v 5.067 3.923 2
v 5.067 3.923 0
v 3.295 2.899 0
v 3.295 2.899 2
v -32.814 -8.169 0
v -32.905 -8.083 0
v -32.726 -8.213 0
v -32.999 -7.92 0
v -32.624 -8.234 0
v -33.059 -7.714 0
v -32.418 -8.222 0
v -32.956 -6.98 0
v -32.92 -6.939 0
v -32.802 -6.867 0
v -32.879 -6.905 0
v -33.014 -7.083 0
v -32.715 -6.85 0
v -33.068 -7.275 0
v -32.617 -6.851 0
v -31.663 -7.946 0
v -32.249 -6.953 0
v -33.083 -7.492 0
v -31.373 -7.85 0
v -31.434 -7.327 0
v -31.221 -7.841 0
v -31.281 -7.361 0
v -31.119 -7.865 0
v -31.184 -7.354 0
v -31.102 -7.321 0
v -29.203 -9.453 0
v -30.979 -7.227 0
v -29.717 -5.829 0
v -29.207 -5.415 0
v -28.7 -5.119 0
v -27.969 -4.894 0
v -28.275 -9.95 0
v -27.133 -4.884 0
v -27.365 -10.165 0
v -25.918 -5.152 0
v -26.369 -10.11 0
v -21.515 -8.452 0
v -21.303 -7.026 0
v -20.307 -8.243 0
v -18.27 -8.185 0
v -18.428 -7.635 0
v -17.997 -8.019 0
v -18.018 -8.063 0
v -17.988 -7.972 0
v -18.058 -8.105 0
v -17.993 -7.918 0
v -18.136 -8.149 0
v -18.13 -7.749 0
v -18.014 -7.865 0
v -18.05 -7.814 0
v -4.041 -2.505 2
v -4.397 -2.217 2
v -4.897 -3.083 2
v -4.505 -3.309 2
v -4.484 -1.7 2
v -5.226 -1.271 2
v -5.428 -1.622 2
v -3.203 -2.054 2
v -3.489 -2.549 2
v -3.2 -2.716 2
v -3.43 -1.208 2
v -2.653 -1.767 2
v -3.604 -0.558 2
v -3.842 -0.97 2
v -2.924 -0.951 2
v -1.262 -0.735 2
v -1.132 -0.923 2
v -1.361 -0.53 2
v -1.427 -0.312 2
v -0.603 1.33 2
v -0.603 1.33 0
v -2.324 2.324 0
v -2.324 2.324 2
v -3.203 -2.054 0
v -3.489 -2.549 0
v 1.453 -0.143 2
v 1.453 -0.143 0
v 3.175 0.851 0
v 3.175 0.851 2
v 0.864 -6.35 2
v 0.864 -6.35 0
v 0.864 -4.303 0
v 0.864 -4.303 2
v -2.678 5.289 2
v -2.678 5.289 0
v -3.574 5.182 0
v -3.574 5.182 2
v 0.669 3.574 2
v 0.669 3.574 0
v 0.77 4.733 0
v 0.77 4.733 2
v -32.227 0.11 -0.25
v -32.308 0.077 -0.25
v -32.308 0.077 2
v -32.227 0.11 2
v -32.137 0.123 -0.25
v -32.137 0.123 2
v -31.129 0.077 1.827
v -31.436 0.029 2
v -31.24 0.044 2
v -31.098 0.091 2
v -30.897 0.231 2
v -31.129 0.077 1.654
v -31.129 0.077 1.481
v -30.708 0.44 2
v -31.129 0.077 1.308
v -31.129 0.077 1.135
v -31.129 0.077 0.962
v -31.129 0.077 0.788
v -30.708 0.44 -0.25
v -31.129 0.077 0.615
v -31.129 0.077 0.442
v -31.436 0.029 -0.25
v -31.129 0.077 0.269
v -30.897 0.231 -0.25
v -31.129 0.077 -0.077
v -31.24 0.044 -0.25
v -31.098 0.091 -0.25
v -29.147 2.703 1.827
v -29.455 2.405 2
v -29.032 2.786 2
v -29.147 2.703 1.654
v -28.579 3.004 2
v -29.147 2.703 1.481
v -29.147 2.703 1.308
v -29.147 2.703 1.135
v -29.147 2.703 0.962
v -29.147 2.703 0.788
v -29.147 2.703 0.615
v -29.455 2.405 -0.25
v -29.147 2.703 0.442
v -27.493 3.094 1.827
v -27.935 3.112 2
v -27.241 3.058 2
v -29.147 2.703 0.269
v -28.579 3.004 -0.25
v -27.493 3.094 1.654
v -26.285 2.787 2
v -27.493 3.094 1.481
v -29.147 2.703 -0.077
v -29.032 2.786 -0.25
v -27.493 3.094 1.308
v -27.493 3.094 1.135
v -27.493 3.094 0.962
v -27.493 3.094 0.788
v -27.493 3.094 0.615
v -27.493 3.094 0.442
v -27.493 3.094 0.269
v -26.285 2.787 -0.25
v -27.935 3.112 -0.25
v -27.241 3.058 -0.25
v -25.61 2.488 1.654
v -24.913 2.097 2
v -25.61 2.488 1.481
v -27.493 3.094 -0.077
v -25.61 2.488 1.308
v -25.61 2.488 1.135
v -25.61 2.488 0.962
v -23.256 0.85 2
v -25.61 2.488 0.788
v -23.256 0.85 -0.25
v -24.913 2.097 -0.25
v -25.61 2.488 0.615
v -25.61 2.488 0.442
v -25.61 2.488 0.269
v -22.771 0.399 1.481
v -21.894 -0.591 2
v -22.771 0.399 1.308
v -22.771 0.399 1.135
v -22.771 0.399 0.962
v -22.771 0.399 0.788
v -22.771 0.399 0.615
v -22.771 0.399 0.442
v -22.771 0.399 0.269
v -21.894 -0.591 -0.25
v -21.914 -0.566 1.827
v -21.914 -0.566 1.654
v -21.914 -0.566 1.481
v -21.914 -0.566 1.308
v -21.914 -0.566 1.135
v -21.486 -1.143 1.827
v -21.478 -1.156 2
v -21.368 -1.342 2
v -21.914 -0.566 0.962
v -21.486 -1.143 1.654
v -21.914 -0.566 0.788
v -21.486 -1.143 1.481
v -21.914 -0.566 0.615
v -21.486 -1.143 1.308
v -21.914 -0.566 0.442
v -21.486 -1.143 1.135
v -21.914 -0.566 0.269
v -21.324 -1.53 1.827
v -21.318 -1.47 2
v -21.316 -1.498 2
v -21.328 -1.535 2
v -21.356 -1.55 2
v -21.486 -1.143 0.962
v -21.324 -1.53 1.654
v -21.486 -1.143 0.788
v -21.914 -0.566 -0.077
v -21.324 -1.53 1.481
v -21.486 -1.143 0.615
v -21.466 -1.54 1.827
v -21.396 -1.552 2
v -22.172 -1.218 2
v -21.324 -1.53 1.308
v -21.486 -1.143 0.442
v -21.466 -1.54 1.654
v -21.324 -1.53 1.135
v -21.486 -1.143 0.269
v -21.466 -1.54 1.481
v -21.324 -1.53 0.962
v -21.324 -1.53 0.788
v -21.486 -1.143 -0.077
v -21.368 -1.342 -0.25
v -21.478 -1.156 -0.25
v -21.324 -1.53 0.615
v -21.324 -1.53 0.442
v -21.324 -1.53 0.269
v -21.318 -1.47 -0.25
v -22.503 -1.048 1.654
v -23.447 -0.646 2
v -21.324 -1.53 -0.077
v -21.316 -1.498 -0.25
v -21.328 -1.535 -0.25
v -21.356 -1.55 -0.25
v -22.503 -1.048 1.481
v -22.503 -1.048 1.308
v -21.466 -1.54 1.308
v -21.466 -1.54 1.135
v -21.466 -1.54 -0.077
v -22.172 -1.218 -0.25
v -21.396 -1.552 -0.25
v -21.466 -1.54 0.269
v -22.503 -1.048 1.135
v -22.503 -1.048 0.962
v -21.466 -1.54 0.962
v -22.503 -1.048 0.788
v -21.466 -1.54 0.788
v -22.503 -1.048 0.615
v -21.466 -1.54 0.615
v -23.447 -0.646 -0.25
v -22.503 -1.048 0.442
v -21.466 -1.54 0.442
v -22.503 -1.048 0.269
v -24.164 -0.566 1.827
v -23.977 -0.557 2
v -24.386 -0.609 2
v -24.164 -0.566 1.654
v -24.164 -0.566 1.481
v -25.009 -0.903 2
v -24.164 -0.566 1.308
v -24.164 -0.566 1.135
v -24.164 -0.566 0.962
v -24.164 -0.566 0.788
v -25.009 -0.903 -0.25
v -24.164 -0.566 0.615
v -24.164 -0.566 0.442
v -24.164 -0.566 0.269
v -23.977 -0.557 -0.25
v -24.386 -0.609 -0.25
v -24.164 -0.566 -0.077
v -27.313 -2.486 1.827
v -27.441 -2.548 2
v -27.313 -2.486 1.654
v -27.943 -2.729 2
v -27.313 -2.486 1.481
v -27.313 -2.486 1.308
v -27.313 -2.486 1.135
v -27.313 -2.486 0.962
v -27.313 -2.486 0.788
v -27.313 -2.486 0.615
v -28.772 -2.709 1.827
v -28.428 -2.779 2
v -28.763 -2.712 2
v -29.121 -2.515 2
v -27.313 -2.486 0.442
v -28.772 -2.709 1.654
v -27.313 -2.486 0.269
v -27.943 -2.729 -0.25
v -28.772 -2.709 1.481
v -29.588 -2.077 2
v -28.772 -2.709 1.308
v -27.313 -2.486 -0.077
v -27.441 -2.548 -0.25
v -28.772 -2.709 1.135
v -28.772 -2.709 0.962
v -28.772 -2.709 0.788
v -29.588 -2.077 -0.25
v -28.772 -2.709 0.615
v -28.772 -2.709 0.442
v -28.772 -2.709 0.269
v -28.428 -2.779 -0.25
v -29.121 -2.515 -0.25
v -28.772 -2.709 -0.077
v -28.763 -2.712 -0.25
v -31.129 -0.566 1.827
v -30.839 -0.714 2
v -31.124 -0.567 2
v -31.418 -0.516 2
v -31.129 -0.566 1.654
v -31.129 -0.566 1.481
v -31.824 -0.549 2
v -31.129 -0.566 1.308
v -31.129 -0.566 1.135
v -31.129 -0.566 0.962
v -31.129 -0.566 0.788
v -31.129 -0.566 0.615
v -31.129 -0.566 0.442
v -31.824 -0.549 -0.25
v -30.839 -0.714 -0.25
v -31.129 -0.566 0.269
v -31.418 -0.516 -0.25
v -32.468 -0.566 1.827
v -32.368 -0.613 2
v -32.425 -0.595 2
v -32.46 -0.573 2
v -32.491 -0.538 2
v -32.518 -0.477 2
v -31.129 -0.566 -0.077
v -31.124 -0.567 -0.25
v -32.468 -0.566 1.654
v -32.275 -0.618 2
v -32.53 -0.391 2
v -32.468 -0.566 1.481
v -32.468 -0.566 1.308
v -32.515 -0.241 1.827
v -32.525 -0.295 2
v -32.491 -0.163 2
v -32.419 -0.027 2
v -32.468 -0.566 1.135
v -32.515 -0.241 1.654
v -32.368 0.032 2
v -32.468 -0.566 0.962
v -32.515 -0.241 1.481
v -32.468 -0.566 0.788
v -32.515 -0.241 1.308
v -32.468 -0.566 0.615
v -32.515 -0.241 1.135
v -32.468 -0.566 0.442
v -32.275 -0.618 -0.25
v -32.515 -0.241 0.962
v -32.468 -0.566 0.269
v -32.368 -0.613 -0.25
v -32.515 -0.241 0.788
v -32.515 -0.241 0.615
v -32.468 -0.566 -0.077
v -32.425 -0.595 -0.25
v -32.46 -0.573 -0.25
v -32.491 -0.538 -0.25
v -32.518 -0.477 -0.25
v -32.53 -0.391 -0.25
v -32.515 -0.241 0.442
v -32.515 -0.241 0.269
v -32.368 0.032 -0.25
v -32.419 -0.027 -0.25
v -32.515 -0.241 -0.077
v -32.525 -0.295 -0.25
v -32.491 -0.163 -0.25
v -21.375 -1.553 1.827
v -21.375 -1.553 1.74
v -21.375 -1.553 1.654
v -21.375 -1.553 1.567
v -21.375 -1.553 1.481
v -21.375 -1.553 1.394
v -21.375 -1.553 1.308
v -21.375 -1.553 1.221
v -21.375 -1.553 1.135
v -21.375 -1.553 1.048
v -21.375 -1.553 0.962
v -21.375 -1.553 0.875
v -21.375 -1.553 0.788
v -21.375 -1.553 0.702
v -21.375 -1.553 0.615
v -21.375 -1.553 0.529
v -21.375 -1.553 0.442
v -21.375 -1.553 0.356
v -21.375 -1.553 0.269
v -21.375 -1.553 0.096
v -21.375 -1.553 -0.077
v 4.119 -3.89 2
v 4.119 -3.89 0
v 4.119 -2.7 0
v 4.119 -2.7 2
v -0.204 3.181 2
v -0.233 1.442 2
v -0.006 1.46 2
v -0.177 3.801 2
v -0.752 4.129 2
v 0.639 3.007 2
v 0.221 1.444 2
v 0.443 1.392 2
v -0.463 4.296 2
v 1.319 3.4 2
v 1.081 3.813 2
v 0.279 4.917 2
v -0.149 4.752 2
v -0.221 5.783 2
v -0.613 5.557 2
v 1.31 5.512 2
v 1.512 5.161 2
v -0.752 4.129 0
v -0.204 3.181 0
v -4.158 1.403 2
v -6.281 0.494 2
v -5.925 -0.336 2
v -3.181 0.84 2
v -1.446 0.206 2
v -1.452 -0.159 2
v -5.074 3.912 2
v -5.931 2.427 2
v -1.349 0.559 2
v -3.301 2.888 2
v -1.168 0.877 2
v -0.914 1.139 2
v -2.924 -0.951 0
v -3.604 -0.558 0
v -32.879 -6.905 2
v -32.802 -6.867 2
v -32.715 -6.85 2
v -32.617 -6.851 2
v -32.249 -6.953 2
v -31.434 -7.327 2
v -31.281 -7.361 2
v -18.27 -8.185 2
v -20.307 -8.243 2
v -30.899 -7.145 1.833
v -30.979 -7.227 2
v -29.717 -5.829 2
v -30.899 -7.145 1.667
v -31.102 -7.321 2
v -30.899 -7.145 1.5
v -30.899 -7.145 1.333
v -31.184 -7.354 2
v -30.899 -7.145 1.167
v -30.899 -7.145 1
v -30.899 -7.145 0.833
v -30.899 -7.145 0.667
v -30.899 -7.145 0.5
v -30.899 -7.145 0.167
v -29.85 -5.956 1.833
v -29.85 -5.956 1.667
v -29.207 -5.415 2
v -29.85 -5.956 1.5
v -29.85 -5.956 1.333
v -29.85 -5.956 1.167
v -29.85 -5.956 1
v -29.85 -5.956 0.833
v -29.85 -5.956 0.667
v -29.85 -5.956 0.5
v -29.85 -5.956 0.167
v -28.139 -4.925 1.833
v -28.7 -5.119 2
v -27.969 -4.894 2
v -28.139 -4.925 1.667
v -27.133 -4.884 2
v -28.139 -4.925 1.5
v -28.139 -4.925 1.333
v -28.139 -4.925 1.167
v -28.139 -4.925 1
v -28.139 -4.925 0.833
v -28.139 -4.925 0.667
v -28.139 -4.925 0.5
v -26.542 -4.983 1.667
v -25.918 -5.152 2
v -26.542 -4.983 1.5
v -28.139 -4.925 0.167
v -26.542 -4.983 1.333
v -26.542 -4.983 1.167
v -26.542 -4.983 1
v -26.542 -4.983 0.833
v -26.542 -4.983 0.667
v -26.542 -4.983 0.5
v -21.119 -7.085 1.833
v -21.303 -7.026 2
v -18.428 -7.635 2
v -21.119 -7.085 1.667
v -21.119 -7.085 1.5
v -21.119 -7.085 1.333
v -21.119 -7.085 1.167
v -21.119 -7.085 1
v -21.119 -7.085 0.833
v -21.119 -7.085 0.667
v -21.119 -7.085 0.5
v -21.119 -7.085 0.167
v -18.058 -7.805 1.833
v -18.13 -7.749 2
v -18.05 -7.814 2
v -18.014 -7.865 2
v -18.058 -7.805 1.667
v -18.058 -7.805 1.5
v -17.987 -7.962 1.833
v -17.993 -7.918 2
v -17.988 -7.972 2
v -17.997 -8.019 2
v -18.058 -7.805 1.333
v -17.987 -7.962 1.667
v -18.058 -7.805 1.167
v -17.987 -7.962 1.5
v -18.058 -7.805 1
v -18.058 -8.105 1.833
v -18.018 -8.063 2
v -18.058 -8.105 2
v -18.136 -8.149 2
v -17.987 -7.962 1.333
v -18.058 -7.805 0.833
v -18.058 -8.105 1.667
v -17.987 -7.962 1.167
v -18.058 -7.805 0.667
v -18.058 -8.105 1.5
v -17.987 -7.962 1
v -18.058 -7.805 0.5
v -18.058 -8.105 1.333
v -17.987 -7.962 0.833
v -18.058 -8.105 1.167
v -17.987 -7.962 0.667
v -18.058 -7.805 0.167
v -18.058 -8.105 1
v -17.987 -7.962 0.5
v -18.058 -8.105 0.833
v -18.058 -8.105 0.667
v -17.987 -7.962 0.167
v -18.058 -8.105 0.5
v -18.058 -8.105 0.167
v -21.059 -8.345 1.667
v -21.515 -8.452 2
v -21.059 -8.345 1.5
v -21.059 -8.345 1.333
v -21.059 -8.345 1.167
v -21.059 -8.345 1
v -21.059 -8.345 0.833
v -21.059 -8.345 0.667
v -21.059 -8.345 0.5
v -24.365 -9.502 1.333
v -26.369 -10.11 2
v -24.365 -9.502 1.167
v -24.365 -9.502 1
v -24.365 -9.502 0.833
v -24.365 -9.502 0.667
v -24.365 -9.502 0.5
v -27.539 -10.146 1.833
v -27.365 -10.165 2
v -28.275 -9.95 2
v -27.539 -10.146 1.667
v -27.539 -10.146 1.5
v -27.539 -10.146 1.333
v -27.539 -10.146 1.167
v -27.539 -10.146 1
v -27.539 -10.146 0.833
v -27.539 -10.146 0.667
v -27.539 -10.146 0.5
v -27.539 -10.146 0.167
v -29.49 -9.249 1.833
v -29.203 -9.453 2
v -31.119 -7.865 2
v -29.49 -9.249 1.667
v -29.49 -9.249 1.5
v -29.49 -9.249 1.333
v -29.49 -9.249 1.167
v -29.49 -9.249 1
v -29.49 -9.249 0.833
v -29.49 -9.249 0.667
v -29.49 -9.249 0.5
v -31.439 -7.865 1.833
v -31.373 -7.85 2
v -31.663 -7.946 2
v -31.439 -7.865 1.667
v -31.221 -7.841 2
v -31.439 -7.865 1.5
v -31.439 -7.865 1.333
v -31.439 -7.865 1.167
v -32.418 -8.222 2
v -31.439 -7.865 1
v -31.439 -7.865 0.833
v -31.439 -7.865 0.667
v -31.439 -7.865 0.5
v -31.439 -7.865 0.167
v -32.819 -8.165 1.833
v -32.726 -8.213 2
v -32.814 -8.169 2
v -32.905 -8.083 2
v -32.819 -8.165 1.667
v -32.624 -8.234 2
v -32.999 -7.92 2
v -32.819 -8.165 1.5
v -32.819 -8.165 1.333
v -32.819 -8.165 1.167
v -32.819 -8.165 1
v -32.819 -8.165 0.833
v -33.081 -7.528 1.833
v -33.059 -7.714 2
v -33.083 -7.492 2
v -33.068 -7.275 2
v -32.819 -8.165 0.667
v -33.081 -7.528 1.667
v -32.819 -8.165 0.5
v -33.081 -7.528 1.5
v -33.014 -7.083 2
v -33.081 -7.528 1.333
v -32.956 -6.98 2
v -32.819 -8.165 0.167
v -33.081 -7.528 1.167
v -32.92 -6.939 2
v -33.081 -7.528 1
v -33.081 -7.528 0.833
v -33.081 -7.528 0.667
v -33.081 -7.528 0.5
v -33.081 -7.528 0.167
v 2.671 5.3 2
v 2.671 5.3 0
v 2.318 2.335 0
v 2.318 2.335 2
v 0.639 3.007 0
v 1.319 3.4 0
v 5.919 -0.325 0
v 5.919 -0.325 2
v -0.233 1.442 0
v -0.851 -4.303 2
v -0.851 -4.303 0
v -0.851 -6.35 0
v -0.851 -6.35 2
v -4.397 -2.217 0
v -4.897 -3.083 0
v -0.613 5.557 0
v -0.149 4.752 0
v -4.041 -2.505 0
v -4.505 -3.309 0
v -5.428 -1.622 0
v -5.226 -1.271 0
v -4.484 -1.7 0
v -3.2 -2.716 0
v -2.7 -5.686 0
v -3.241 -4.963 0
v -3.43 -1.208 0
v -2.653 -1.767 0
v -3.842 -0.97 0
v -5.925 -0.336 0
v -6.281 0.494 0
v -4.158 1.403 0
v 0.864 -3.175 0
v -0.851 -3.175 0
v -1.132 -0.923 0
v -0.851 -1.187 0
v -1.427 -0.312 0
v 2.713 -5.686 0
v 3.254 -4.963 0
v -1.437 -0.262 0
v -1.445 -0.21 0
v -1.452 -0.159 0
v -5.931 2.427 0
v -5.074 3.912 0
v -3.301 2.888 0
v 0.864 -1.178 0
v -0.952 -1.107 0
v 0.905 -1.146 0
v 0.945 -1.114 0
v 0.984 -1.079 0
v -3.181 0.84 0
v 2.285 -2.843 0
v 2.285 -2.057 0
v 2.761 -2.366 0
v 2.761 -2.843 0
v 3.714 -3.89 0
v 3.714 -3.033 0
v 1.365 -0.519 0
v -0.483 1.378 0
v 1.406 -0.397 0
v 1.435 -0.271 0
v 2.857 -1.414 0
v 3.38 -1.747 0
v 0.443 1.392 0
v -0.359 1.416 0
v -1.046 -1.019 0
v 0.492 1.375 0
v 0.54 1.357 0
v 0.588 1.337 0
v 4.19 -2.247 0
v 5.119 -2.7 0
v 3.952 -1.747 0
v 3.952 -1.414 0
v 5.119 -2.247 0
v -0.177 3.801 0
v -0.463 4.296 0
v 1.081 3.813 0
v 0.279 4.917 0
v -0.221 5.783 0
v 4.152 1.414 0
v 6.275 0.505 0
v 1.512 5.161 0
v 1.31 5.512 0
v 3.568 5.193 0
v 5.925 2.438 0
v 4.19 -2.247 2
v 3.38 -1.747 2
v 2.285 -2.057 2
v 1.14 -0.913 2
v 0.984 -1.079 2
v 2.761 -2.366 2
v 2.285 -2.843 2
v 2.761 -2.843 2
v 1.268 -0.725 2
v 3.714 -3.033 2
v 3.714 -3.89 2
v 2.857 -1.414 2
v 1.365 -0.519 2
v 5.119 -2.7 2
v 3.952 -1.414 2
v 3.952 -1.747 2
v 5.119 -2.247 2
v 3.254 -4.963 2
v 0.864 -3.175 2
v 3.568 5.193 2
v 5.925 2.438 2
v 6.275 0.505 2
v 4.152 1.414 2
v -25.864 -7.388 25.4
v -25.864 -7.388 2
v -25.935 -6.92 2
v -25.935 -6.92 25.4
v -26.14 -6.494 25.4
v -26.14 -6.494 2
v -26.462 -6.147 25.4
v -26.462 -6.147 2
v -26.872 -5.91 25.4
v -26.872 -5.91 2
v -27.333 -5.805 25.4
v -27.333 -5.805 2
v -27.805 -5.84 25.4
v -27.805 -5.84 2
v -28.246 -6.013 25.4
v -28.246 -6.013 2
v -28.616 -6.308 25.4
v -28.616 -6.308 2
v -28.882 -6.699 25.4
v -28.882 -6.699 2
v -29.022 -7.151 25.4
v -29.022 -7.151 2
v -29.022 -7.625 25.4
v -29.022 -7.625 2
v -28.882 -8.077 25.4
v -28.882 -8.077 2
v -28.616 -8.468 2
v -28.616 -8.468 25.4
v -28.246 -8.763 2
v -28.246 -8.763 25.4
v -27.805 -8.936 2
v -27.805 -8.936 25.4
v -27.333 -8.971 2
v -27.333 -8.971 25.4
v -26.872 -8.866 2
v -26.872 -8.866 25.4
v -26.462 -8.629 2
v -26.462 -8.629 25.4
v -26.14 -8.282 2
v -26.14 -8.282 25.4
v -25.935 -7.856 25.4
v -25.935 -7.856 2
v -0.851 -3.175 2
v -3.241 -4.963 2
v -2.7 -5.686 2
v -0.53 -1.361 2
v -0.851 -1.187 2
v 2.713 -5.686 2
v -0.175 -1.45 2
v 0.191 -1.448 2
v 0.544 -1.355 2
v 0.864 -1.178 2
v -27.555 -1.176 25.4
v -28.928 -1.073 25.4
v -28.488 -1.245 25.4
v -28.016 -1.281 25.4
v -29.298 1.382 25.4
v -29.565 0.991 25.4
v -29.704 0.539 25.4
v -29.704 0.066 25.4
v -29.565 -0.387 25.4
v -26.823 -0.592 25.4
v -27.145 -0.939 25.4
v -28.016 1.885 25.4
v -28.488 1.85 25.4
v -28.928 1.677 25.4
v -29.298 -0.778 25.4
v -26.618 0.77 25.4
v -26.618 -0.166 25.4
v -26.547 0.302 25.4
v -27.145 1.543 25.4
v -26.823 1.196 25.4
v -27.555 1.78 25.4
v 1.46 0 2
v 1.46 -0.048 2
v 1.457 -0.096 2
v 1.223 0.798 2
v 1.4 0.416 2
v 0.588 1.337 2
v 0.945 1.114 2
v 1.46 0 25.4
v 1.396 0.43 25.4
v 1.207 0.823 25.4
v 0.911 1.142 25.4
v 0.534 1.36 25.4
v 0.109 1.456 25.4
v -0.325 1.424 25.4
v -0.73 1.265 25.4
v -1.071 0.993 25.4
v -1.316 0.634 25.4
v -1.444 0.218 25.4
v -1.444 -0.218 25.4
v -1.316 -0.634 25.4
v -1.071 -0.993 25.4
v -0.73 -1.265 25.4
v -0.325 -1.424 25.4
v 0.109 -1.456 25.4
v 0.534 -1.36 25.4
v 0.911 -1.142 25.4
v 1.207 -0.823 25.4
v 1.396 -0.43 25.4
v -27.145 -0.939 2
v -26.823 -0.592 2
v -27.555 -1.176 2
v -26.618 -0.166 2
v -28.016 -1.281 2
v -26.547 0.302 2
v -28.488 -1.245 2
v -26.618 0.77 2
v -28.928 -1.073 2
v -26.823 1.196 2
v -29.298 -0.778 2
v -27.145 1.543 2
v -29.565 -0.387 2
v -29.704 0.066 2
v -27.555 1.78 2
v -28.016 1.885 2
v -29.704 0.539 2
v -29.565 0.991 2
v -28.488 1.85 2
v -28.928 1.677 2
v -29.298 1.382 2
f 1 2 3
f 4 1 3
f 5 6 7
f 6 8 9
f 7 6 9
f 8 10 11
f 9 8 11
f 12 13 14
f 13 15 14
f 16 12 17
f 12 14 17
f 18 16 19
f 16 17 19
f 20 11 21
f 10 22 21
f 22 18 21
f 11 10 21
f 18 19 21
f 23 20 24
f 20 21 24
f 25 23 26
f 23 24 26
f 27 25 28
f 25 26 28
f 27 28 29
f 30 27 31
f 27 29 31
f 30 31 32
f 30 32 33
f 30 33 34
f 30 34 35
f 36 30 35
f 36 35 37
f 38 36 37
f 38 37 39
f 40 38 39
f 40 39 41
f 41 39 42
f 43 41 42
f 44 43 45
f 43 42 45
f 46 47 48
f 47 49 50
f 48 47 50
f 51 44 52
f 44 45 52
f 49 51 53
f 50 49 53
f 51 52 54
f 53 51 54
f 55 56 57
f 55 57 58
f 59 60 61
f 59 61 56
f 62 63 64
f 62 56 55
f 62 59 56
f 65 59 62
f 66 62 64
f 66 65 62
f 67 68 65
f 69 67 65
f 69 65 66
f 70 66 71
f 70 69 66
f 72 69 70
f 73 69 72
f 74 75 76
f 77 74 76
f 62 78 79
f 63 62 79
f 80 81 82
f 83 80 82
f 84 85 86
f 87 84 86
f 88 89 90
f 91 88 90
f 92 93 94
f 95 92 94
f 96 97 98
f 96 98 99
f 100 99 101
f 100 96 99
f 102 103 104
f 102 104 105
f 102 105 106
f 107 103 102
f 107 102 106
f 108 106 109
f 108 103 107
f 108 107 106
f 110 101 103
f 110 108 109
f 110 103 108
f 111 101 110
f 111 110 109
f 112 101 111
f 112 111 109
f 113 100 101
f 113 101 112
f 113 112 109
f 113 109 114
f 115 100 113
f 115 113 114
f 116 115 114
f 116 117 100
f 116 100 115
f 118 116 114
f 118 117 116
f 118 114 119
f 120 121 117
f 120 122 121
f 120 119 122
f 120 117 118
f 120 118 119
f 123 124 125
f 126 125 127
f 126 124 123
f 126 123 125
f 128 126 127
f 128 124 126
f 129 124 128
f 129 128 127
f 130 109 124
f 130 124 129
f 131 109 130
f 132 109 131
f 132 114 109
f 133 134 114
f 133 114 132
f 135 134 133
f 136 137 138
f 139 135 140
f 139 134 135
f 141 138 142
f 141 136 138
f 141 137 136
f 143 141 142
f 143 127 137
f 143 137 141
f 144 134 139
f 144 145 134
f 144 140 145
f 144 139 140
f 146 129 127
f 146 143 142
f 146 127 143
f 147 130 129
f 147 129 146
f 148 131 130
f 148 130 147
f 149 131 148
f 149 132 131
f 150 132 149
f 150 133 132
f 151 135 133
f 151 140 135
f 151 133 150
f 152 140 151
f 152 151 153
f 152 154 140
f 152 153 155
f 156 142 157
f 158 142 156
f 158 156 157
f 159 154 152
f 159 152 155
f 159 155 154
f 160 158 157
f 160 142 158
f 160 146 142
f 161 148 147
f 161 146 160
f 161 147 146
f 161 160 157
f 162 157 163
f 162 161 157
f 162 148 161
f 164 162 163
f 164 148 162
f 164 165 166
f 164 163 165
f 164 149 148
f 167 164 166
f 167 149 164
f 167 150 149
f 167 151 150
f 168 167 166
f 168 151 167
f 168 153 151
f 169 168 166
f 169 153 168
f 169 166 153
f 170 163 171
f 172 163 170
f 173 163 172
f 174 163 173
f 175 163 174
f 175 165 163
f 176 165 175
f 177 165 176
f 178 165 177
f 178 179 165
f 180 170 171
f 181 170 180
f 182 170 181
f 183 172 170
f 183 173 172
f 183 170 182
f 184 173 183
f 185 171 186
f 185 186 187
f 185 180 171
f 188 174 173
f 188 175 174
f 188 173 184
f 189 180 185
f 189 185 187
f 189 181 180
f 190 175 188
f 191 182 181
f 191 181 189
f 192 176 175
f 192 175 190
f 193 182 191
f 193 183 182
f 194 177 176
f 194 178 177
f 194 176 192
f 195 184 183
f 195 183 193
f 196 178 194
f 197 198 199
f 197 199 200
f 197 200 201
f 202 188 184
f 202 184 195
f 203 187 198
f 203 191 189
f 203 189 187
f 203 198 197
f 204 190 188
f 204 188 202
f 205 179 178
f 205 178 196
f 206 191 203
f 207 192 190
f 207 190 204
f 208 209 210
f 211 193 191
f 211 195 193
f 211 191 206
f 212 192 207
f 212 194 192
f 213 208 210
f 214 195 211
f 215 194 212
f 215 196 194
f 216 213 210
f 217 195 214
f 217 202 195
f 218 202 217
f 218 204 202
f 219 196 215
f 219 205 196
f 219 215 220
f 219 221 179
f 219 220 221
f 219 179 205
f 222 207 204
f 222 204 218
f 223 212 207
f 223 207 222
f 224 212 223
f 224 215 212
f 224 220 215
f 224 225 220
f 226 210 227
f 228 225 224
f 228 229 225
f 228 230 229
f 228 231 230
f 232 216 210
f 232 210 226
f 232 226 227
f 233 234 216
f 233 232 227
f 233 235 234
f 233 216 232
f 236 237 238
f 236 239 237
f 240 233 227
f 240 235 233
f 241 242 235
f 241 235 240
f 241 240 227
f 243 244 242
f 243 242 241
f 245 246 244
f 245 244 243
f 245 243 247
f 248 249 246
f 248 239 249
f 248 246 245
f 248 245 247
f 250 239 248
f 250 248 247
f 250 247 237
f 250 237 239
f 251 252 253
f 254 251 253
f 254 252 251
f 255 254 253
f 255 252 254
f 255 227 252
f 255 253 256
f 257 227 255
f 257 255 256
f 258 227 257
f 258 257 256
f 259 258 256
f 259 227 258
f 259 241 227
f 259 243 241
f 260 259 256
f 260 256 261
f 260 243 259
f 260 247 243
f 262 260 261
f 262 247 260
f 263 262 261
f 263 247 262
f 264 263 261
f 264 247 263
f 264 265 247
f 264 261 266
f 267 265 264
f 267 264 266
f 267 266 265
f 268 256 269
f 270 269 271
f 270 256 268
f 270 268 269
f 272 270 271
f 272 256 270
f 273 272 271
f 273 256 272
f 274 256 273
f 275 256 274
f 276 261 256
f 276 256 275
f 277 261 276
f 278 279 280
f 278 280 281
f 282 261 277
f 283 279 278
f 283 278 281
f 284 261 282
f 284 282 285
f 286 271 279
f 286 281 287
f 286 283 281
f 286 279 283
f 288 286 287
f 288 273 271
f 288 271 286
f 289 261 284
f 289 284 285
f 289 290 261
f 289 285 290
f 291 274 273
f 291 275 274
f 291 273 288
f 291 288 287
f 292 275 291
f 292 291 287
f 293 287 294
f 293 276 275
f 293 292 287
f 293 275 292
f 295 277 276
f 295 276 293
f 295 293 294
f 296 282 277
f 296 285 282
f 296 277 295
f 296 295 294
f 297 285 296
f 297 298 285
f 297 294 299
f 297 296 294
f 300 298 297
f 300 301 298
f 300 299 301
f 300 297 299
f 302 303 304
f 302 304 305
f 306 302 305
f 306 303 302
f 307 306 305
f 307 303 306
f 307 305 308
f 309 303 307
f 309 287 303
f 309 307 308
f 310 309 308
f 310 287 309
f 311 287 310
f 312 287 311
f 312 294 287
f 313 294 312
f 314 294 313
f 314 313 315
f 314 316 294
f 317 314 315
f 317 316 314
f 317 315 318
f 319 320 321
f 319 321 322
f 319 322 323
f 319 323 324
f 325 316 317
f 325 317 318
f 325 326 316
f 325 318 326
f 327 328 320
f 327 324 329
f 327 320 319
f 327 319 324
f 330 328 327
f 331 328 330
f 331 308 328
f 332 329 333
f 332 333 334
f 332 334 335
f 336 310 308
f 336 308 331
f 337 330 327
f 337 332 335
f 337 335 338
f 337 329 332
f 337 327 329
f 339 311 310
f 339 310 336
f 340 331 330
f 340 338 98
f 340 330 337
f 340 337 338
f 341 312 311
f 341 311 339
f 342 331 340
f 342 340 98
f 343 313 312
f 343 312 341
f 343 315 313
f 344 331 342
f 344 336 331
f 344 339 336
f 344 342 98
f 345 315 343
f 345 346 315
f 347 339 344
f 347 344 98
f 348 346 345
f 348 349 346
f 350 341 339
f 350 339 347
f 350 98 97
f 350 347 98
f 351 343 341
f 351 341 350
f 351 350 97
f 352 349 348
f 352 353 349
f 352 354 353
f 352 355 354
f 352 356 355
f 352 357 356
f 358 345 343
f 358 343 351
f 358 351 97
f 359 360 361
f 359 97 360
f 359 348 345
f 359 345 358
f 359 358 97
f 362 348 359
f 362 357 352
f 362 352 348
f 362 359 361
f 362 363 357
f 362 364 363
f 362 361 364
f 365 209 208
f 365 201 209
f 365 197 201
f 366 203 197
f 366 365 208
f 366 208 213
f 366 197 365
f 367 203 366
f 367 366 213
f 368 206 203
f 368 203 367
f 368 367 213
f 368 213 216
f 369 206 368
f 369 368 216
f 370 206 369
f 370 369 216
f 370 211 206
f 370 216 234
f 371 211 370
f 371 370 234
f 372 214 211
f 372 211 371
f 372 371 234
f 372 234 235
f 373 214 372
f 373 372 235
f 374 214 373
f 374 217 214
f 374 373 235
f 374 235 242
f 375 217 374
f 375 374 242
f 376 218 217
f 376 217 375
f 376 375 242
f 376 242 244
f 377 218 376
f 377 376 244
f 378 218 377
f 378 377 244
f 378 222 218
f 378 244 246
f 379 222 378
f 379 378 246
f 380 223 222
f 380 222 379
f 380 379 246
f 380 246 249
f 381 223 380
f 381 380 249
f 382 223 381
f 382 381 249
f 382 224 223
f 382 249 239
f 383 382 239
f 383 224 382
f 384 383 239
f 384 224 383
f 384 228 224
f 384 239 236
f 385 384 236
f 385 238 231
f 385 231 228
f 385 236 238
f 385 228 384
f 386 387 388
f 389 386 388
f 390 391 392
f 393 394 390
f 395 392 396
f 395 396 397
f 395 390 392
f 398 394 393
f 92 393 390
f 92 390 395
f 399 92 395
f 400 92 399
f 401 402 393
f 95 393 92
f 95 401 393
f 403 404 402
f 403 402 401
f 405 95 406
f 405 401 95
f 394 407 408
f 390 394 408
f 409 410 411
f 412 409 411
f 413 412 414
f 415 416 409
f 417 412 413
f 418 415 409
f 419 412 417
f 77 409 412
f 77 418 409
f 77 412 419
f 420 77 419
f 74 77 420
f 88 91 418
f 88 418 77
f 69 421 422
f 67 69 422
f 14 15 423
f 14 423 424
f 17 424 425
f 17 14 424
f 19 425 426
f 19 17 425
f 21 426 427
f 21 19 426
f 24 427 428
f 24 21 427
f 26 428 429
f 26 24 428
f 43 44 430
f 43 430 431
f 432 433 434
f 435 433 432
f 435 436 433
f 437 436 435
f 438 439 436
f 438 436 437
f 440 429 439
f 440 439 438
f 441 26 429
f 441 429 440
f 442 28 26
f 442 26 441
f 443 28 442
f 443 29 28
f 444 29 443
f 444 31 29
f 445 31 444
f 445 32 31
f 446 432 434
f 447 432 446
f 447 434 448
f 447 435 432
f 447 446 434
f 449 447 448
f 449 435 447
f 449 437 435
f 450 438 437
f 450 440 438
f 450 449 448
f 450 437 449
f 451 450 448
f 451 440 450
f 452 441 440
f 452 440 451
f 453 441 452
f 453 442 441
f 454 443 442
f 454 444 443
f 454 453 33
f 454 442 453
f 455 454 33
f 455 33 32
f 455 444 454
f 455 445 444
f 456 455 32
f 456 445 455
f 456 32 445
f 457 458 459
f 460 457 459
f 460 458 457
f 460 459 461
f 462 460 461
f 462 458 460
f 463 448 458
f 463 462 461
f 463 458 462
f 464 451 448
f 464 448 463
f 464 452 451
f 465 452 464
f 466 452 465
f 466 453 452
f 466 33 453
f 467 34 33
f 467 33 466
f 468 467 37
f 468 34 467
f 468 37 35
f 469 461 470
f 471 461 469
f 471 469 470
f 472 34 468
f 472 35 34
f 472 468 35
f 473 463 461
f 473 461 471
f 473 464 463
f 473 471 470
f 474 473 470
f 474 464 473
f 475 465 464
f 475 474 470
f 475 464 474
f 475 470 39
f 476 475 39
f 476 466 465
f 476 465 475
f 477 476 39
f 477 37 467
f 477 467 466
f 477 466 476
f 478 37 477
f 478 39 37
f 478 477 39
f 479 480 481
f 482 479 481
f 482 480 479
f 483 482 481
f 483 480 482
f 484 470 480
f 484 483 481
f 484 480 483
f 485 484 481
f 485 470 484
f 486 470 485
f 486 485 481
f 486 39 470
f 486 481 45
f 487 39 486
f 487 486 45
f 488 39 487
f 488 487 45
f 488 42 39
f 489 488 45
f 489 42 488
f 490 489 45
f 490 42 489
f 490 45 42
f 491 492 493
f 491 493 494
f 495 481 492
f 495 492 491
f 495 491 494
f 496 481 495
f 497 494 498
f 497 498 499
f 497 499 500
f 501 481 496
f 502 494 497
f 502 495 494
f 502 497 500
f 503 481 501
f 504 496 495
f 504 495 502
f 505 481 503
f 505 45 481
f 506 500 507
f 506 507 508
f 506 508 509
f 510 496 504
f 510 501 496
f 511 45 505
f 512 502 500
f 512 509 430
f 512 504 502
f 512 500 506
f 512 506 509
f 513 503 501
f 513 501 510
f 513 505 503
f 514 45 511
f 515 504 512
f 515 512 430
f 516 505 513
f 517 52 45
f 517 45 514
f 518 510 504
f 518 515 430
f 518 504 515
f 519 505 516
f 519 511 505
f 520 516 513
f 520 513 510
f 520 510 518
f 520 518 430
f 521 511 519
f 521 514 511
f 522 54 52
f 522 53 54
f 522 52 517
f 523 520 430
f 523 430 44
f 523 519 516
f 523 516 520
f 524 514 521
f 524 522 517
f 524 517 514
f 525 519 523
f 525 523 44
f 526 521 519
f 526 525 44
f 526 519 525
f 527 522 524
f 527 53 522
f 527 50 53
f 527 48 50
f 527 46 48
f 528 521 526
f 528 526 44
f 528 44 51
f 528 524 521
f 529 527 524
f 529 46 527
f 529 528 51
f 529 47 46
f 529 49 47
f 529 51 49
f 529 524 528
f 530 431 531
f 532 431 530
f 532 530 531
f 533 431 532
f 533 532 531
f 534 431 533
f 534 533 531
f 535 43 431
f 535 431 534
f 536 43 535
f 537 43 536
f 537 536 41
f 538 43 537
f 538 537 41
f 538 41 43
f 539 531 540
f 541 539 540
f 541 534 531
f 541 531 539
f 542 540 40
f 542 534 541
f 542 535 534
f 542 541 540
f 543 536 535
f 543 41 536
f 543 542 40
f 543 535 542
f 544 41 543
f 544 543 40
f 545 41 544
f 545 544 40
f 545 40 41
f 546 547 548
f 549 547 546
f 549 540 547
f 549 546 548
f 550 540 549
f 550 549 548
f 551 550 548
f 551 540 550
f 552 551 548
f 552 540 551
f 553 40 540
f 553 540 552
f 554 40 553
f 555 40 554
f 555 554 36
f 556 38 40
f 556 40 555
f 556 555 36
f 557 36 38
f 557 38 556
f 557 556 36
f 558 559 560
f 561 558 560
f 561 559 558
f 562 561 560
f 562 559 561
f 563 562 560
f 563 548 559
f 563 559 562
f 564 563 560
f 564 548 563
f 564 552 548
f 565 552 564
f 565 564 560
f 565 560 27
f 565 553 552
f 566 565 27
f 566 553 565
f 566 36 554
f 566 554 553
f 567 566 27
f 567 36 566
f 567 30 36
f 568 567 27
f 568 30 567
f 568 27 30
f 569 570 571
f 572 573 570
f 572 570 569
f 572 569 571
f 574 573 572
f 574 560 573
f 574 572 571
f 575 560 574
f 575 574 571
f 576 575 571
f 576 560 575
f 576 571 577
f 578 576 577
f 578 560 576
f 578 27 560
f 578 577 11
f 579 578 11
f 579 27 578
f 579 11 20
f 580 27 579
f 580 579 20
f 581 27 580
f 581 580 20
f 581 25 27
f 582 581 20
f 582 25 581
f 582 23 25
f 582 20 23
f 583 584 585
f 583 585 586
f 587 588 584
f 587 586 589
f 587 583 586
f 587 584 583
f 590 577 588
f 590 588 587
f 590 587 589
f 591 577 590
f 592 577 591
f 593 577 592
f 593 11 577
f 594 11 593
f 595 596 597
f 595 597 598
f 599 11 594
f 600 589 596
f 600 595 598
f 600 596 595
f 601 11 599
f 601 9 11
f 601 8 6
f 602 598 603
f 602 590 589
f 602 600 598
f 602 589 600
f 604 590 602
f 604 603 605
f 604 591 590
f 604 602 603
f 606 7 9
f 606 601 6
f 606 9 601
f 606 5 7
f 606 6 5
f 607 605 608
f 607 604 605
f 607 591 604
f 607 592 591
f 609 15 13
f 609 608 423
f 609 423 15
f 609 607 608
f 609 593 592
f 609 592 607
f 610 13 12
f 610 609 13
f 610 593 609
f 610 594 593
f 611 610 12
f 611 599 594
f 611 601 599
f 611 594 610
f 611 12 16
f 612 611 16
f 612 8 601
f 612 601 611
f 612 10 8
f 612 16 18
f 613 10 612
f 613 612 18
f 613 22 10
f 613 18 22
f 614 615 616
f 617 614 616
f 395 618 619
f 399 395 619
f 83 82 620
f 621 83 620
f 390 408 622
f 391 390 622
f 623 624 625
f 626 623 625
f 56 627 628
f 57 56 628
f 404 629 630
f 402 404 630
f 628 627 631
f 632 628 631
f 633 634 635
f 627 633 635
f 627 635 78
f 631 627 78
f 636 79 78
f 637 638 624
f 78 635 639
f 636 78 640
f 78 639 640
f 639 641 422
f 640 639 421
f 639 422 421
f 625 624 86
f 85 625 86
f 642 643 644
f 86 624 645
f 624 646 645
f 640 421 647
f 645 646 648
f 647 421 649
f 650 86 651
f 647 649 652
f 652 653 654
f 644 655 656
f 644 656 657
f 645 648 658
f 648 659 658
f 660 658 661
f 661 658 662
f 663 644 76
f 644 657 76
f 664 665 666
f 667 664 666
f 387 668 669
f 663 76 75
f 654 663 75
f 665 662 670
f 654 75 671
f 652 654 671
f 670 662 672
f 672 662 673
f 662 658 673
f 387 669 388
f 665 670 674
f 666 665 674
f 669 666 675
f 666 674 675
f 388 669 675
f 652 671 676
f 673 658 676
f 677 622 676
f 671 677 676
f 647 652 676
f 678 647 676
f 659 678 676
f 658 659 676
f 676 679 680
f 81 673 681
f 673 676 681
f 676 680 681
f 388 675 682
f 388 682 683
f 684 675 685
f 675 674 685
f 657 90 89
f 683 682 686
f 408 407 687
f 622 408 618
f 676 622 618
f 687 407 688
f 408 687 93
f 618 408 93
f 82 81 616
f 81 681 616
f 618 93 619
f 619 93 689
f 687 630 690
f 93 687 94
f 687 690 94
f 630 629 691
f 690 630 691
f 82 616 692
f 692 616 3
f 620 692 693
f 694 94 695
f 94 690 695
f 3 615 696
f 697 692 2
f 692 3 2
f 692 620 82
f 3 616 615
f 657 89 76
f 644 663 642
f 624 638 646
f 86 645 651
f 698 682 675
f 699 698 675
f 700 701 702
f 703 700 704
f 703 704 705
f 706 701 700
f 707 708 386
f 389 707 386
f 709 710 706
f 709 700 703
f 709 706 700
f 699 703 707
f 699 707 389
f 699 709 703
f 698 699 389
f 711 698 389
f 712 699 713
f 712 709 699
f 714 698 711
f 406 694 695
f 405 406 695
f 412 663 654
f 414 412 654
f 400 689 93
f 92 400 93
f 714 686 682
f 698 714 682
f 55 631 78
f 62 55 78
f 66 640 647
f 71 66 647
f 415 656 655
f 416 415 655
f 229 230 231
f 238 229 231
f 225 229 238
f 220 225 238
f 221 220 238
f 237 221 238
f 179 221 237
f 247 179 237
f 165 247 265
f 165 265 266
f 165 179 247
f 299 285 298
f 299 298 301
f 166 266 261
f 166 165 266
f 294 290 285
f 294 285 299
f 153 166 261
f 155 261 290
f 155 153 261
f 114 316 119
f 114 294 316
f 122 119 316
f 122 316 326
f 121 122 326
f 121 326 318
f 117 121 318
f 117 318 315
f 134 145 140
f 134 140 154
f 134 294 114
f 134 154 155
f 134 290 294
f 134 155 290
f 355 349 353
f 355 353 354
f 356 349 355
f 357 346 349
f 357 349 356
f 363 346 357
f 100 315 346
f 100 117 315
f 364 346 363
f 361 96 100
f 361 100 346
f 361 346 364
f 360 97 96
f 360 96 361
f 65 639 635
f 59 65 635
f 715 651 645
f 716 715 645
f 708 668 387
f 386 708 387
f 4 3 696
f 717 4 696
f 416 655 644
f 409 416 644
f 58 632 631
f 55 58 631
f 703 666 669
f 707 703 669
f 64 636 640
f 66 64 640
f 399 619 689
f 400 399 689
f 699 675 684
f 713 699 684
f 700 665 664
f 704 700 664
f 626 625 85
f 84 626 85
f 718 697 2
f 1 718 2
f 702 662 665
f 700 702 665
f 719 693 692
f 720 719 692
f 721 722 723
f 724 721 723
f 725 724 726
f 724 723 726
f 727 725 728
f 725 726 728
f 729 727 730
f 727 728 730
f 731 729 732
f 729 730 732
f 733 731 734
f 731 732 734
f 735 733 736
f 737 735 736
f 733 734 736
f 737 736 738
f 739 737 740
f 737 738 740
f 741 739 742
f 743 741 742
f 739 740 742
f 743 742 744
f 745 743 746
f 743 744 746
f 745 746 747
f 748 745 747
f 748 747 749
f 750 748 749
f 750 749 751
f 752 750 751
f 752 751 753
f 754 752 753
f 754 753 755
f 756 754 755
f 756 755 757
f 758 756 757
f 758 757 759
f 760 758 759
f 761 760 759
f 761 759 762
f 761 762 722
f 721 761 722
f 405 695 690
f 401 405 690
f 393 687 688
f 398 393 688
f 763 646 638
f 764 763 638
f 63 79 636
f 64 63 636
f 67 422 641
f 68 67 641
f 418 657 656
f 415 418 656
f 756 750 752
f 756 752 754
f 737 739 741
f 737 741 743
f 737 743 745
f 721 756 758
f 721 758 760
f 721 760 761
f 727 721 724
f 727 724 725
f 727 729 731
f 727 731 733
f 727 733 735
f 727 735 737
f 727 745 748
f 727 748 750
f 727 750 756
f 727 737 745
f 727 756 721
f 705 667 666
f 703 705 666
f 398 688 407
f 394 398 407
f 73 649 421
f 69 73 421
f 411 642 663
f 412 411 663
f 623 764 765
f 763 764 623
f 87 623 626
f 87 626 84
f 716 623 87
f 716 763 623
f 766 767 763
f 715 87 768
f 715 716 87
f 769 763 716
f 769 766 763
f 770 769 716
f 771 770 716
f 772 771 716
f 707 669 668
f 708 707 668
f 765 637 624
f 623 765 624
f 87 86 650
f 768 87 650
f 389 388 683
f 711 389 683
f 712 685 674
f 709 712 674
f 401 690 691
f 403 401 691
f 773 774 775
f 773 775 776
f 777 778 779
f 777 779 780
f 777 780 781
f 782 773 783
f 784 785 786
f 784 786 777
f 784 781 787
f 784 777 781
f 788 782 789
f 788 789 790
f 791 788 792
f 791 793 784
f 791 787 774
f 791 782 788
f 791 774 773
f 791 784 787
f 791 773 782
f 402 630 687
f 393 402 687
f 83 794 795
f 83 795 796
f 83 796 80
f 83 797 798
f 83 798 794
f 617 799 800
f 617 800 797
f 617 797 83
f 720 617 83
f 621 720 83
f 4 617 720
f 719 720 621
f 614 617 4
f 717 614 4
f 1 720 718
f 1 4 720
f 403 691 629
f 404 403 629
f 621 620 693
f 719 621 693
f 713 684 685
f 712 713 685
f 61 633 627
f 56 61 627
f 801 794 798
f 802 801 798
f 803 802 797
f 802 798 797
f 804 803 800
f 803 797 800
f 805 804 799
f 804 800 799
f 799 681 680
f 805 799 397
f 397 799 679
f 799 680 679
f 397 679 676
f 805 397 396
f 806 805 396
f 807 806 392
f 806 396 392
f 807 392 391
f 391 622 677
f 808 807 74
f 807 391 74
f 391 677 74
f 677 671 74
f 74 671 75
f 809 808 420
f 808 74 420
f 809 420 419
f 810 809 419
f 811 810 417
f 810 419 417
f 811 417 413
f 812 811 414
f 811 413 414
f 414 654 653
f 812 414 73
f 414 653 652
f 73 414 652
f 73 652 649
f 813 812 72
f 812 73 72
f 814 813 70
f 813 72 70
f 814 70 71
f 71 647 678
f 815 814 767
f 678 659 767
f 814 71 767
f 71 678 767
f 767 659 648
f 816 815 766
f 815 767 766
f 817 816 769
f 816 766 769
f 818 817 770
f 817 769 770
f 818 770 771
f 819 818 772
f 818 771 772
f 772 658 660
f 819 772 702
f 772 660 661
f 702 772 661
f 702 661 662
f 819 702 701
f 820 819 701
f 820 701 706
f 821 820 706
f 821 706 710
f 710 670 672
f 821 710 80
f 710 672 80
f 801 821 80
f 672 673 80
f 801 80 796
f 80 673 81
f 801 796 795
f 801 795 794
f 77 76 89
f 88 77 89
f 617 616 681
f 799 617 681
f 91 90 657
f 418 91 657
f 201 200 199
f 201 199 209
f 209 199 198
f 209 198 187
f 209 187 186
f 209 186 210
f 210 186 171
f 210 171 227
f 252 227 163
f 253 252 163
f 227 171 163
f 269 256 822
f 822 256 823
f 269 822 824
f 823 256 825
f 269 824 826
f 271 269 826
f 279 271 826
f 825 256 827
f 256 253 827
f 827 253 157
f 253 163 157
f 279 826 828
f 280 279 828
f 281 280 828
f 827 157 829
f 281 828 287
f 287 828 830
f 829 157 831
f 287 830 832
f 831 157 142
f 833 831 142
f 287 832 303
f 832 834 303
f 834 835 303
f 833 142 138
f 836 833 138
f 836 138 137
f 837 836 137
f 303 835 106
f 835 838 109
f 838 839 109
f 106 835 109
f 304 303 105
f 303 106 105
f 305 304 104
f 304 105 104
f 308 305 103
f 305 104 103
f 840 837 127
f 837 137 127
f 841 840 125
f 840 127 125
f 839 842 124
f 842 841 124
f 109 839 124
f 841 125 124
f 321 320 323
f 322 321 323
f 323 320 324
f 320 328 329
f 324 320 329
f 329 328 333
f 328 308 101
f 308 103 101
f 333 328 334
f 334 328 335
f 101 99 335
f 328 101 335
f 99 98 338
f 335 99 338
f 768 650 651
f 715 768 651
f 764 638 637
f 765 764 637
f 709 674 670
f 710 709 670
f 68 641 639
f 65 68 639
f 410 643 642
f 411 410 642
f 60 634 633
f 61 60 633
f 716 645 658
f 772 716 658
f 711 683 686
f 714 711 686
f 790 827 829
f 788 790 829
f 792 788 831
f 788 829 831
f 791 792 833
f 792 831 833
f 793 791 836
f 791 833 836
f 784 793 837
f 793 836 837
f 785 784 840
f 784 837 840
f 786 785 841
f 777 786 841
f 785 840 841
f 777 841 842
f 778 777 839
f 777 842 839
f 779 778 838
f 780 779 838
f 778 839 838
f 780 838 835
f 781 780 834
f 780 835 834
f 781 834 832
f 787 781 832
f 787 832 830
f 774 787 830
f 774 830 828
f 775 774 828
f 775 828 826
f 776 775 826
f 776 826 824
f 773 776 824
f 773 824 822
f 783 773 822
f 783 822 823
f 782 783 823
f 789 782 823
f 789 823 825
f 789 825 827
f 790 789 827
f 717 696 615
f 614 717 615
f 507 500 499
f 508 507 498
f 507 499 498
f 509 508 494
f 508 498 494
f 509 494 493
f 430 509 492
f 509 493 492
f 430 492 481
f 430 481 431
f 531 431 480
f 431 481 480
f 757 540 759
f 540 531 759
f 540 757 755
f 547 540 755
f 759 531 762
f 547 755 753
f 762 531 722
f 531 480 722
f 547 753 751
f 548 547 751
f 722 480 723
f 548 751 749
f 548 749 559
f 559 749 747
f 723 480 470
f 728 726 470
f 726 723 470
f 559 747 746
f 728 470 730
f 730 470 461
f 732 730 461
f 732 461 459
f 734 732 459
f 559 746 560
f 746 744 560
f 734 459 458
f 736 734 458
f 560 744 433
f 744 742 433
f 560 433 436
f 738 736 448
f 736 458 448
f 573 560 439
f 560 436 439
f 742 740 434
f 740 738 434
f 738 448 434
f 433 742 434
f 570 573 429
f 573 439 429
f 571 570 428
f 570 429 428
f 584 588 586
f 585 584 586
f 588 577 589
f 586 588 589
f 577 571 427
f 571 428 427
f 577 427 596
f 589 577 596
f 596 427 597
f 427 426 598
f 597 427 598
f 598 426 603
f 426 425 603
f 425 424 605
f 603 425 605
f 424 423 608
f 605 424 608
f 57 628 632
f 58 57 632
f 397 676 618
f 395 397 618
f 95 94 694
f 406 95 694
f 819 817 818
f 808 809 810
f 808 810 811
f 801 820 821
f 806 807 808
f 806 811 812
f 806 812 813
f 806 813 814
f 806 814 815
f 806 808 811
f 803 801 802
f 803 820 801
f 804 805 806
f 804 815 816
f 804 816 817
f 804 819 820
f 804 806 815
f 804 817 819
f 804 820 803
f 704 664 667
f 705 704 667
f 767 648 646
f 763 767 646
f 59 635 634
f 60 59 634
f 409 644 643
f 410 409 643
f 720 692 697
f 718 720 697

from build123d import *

# Parameters (mm, degrees)
F2_DEPTH  = 2
F1_R      = 1.4605
F3_DEPTH  = 25.4
F5_DEPTH  = 1
F7_SCALE  = 2.25
F9_R      = 1.5875
F10_DEPTH = 25.4
F13_DEPTH = 2
F12_R     = 1.5875
F14_DEPTH = 25.4


# Not quite as in the source:
# - ends of sketch curves that miss each other by under 0.0002 mm in the source are joined
# - a feature names something its author has since deleted; it is built from what else it names


with BuildPart() as f2:
    # F0 (on Top) → F2 (new body)
    with BuildSketch(Plane.XY):
        Polygon((0.3471141813, -0.6012196677), (-0.1371353539, -0.2375256701), (-0.2495522491, -0.4322374442), (-0.4318002417, -0.747900227), (-0.6211034032, -0.6386059958), (-0.8508992831, -0.7662402189), (-0.8508992831, -3.1749998652), (-0.8508992831, -4.3027643429), (-0.8508992831, -6.3499998652), (0.8636007169, -6.3499998652), (0.8636007169, -4.3027643429), (0.8636007169, -3.1749998652), (0.8636007169, -0.9891251569), (0.483299174, -0.703500952), (0.4254495248, -0.7369004626), align=None)
        Polygon((-0.8508992831, -4.3027643429), (-0.8508992831, -3.1749998652), (-3.2412230885, -4.9631580294), (-2.7002857532, -5.6862570345), align=None)
        Polygon((3.2539245223, -4.9631580294), (0.8636007169, -3.1749998652), (0.8636007169, -4.3027643429), (2.7129871871, -5.6862570345), align=None)
        Polygon((-0.8508992831, -0.0667988863), (-0.6942285962, 1.348e-07), (-0.8508992831, 1.348e-07), align=None)
        Polygon((-0.6942285962, 1.348e-07), (-0.1371355874, 0.2375255353), (-0.2495524826, 0.4322373094), (-0.4318004752, 0.7479000922), (-0.2424973138, 0.8571943234), (-0.2381338534, 1.1200205046), (-2.3241808987, 2.3244003278), (-3.3008535859, 2.8882825667), (-5.0738115558, 3.9119003278), (-5.9310615558, 2.427099773), (-4.1581035859, 1.4034820119), (-3.1814308987, 0.839599773), (-1.2884078719, -0.2533375811), (-0.8508992831, -0.0667988863), (-0.8508992831, 1.348e-07), align=None)
        Polygon((-0.8508992831, -0.7662402189), (-0.8508992831, -0.5059332827), (-1.2884078719, -0.2533375811), (-2.9236705151, -0.950557629), (-3.6042041051, -0.5576513776), (-3.8423290847, -0.9700959409), (-3.4298843198, -1.208221037), (-4.4835569455, -1.6997353006), (-5.2259572804, -1.2711102674), (-5.4283635946, -1.6216882874), (-4.3972519847, -2.2170008529), (-4.8973144653, -3.0831344762), (-4.5054921503, -3.3093531953), (-4.0411482187, -2.5050859137), (-3.2032690115, -2.0539615173), (-3.4890190337, -2.5488950739), (-3.2003078595, -2.7155825481), (-2.6526203364, -1.7669599314), align=None)
        Polygon((-5.9251831976, -0.3364022836), (-3.1814308987, 0.839599773), (-4.1581035859, 1.4034820119), (-6.2809366379, 0.4936126931), align=None)
        Polygon((-3.3008535859, 2.8882825667), (-2.3241808987, 2.3244003278), (-2.6776093922, 5.2885605486), (-3.5743001677, 5.181644577), align=None)
        Polygon((-0.0127014339, 0.9898670365), (0.4248071549, 1.242462738), (0.6386282031, 3.0072517529), (1.3191617931, 3.4001580042), (1.0810368134, 3.8126025675), (0.6685920485, 3.5744774715), (0.7697645227, 4.7327418644), (1.5121648577, 5.1613668976), (1.3097585434, 5.5119449176), (0.2786469335, 4.916632352), (-0.2214155471, 5.7827659754), (-0.6132378621, 5.5565472563), (-0.1488939305, 4.7522799747), (-0.1771483466, 3.8010930978), (-0.4628983688, 4.2960266544), (-0.7516095429, 4.1293391803), (-0.2039220199, 3.1807165637), (-0.2381338534, 1.1200205046), align=None)
        Polygon((2.6712586753, 5.299560313), (2.3178301818, 2.3354000922), (3.294502869, 2.8992823311), (3.5679494508, 5.1926443415), align=None)
        Polygon((0.2742709413, 1.348e-07), (0.4991047317, 1.348e-07), (0.8636007169, 1.348e-07), (0.8636007169, -0.2185883276), (1.0890331365, -0.3537802858), (3.1750801818, 0.8505995374), (4.151752869, 1.4144817763), (5.9247108388, 2.4380995374), (5.0674608388, 3.9229000922), (3.294502869, 2.8992823311), (2.3178301818, 2.3354000922), (0.4248071549, 1.242462738), (0.3676001091, 0.7702998383), (0.4254497583, 0.7369003278), (0.3471144148, 0.6012195329), align=None)
        Polygon((4.151752869, 1.4144817763), (3.1750801818, 0.8505995374), (5.9188324807, -0.3254025192), (6.274585921, 0.5046124575), align=None)
        Polygon((1.0890331365, -0.3537802858), (0.8636007169, -0.4839337539), (0.8636007169, -0.9891251569), (2.285042312, -2.0566941239), (2.285042312, -2.8425066266), (2.7612922713, -2.8425066266), (2.7612922713, -2.3662564345), (3.7137924228, -3.0330065638), (3.7137924228, -3.8902566303), (4.1186050512, -3.8902566303), (4.1186050512, -2.6996314991), (5.1187300123, -2.6996314991), (5.1187300123, -2.2471940611), (4.1900421493, -2.2471940611), (3.3804173581, -1.7471315805), (3.9519174024, -1.7471315805), (3.9519174024, -1.4137566322), (2.8565423563, -1.4137566322), align=None)
        Polygon((0.8636007169, -0.2185883276), (0.4991047317, 1.348e-07), (0.2742709413, 1.348e-07), (0.2266974185, -0.3926517164), (0.3471141813, -0.6012196677), (0.483299174, -0.703500952), (0.8636007169, -0.4839337539), align=None)
        Polygon((-0.1371353539, -0.2375256701), (-0.4533950705, 1.348e-07), (-0.6942285962, 1.348e-07), (-0.8508992831, -0.0667988863), (-0.8508992831, -0.5059332827), (-0.6211034032, -0.6386059958), (-0.2495522491, -0.4322374442), align=None)
        Polygon((0.226697652, 0.3926515816), (0.3471144148, 0.6012195329), (0.3676001091, 0.7702998383), (-0.0127014339, 0.9898670365), (-0.2424973138, 0.8571943234), (-0.2495524826, 0.4322373094), (-0.1371355874, 0.2375255353), align=None)
        Polygon((-0.0127014339, 0.9898670365), (0.3676001091, 0.7702998383), (0.4248071549, 1.242462738), align=None)
        Polygon((1.0890331365, -0.3537802858), (0.8636007169, -0.2185883276), (0.8636007169, -0.4839337539), align=None)
        Polygon((-0.4318002417, -0.747900227), (-0.2495522491, -0.4322374442), (-0.6211034032, -0.6386059958), align=None)
        Polygon((-0.8508992831, -0.7662402189), (-0.6211034032, -0.6386059958), (-0.8508992831, -0.5059332827), align=None)
        Polygon((-0.4318004752, 0.7479000922), (-0.2495524826, 0.4322373094), (-0.2424973138, 0.8571943234), align=None)
        Polygon((-0.2424973138, 0.8571943234), (-0.0127014339, 0.9898670365), (-0.2381338534, 1.1200205046), align=None)
        Polygon((0, 1.348e-07), (0.2742709413, 1.348e-07), (0.3471144148, 0.6012195329), (0.226697652, 0.3926515816), align=None)
        Polygon((-0.1371355874, 0.2375255353), (-1.167e-07, -6.74e-08), (0.226697652, 0.3926515816), align=None)
        Polygon((-0.4533950705, 1.348e-07), (0, 1.348e-07), (-0.1371355874, 0.2375255353), (-0.6942285962, 1.348e-07), align=None)
        Polygon((-0.1371353539, -0.2375256701), (1.167e-07, -6.74e-08), (-0.4533950705, 1.348e-07), align=None)
        Polygon((0.2266974185, -0.3926517164), (-1.167e-07, -6.74e-08), (-0.1371353539, -0.2375256701), (0.3471141813, -0.6012196677), align=None)
        Polygon((0.2266974185, -0.3926517164), (0.2742709413, 1.348e-07), (0, 1.348e-07), align=None)
        Polygon((0.3676001091, 0.7702998383), (0.3471144148, 0.6012195329), (0.4254497583, 0.7369003278), align=None)
        Polygon((0.483299174, -0.703500952), (0.3471141813, -0.6012196677), (0.4254495248, -0.7369004626), align=None)
    extrude(amount=F2_DEPTH)

    # F1 (on Top) → F3 (join)
    with BuildSketch(Plane.XY):
        Circle(F1_R)
    extrude(amount=F3_DEPTH)


with BuildPart() as f5:
    # F4 (on Top) → F5 (new body)
    with BuildSketch(Plane.XY):
        with BuildLine():
            add(Edge.make_bspline(
                [(-29.8669375479, 0.2857499931), (-29.7440304745, 0.3571436979), (-29.1547614666, -0.031081706), (-28.6573535606, 1.9086215428), (-26.8097076406, 1.4876465764), (-25.6137182394, 0.4424417951), (-25.3000873709, 0.0757578444), (-24.7765698555, -0.6160305024), (-25.5747691832, -0.1631625611), (-26.2801418295, 0.1338939544), (-26.9852315195, -0.4157522042), (-28.4156101147, -1.4829106615), (-29.1578723902, 0.3232844338), (-30.049192476, -0.1925589818), (-29.9590967439, 0.2322169762), (-29.8669375479, 0.2857499931)],
                knots=[0, 0, 0, 0, 0.0595602967, 0.1590621278, 0.2623182491, 0.3653254409, 0.4276419031, 0.4859643703, 0.5478739218, 0.6200200353, 0.696962825, 0.7939279281, 0.8918484857, 0.9553400069, 1, 1, 1, 1], degree=3))
        make_face()
    extrude(amount=F5_DEPTH)


with BuildPart() as f5_1:
    # F7: moved
    add(f5.part.scale(F7_SCALE).moved(Location((34.892889671, -0.5655468703, -1.25))))


with BuildPart() as f5_2:
    # F8: moved
    add(f5_1.part.moved(Location((0, 0, 1))))

    # F9 (on Top) → F10 (join)
    with BuildSketch(Plane.XY):
        with Locations((-28.1345900148, 0.302218803)):
            Circle(F9_R)
    extrude(amount=F10_DEPTH)


with BuildPart() as f13:
    # F11 (on Top) → F13 (new body)
    with BuildSketch(Plane.XY):
        with BuildLine():
            add(Edge.make_bspline(
                [(-32.8794009984, -6.9053298794), (-32.5540037989, -6.6793889467), (-31.3817308567, -7.5046151757), (-30.8072401032, -7.2022586946), (-28.1363850092, -3.1875440328), (-21.5654529107, -7.6163391855), (-17.9706751628, -7.4839443562), (-17.9570012573, -8.4361565431), (-21.5566094546, -7.6507221771), (-27.4242880142, -11.6673001261), (-30.7065035244, -8.0803469893), (-31.3631183292, -7.6668234126), (-33.0996125613, -8.8138189541), (-33.1778014741, -7.1125255219), (-32.8794009984, -6.9053298794)],
                knots=[0, 0, 0, 0, 0.0668292197, 0.1079970099, 0.2106914958, 0.3585719071, 0.4553176788, 0.4852046131, 0.5798662681, 0.721373447, 0.8281432135, 0.8738706847, 0.9387152963, 1, 1, 1, 1], degree=3))
        make_face()
    extrude(amount=F13_DEPTH)

    # F12 (on Top) → F14 (join)
    with BuildSketch(Plane.XY):
        with Locations((-27.4518691003, -7.3880827986)):
            Circle(F12_R)
    extrude(amount=F14_DEPTH)


solid = Compound([f2.part, f5_2.part, f13.part])
